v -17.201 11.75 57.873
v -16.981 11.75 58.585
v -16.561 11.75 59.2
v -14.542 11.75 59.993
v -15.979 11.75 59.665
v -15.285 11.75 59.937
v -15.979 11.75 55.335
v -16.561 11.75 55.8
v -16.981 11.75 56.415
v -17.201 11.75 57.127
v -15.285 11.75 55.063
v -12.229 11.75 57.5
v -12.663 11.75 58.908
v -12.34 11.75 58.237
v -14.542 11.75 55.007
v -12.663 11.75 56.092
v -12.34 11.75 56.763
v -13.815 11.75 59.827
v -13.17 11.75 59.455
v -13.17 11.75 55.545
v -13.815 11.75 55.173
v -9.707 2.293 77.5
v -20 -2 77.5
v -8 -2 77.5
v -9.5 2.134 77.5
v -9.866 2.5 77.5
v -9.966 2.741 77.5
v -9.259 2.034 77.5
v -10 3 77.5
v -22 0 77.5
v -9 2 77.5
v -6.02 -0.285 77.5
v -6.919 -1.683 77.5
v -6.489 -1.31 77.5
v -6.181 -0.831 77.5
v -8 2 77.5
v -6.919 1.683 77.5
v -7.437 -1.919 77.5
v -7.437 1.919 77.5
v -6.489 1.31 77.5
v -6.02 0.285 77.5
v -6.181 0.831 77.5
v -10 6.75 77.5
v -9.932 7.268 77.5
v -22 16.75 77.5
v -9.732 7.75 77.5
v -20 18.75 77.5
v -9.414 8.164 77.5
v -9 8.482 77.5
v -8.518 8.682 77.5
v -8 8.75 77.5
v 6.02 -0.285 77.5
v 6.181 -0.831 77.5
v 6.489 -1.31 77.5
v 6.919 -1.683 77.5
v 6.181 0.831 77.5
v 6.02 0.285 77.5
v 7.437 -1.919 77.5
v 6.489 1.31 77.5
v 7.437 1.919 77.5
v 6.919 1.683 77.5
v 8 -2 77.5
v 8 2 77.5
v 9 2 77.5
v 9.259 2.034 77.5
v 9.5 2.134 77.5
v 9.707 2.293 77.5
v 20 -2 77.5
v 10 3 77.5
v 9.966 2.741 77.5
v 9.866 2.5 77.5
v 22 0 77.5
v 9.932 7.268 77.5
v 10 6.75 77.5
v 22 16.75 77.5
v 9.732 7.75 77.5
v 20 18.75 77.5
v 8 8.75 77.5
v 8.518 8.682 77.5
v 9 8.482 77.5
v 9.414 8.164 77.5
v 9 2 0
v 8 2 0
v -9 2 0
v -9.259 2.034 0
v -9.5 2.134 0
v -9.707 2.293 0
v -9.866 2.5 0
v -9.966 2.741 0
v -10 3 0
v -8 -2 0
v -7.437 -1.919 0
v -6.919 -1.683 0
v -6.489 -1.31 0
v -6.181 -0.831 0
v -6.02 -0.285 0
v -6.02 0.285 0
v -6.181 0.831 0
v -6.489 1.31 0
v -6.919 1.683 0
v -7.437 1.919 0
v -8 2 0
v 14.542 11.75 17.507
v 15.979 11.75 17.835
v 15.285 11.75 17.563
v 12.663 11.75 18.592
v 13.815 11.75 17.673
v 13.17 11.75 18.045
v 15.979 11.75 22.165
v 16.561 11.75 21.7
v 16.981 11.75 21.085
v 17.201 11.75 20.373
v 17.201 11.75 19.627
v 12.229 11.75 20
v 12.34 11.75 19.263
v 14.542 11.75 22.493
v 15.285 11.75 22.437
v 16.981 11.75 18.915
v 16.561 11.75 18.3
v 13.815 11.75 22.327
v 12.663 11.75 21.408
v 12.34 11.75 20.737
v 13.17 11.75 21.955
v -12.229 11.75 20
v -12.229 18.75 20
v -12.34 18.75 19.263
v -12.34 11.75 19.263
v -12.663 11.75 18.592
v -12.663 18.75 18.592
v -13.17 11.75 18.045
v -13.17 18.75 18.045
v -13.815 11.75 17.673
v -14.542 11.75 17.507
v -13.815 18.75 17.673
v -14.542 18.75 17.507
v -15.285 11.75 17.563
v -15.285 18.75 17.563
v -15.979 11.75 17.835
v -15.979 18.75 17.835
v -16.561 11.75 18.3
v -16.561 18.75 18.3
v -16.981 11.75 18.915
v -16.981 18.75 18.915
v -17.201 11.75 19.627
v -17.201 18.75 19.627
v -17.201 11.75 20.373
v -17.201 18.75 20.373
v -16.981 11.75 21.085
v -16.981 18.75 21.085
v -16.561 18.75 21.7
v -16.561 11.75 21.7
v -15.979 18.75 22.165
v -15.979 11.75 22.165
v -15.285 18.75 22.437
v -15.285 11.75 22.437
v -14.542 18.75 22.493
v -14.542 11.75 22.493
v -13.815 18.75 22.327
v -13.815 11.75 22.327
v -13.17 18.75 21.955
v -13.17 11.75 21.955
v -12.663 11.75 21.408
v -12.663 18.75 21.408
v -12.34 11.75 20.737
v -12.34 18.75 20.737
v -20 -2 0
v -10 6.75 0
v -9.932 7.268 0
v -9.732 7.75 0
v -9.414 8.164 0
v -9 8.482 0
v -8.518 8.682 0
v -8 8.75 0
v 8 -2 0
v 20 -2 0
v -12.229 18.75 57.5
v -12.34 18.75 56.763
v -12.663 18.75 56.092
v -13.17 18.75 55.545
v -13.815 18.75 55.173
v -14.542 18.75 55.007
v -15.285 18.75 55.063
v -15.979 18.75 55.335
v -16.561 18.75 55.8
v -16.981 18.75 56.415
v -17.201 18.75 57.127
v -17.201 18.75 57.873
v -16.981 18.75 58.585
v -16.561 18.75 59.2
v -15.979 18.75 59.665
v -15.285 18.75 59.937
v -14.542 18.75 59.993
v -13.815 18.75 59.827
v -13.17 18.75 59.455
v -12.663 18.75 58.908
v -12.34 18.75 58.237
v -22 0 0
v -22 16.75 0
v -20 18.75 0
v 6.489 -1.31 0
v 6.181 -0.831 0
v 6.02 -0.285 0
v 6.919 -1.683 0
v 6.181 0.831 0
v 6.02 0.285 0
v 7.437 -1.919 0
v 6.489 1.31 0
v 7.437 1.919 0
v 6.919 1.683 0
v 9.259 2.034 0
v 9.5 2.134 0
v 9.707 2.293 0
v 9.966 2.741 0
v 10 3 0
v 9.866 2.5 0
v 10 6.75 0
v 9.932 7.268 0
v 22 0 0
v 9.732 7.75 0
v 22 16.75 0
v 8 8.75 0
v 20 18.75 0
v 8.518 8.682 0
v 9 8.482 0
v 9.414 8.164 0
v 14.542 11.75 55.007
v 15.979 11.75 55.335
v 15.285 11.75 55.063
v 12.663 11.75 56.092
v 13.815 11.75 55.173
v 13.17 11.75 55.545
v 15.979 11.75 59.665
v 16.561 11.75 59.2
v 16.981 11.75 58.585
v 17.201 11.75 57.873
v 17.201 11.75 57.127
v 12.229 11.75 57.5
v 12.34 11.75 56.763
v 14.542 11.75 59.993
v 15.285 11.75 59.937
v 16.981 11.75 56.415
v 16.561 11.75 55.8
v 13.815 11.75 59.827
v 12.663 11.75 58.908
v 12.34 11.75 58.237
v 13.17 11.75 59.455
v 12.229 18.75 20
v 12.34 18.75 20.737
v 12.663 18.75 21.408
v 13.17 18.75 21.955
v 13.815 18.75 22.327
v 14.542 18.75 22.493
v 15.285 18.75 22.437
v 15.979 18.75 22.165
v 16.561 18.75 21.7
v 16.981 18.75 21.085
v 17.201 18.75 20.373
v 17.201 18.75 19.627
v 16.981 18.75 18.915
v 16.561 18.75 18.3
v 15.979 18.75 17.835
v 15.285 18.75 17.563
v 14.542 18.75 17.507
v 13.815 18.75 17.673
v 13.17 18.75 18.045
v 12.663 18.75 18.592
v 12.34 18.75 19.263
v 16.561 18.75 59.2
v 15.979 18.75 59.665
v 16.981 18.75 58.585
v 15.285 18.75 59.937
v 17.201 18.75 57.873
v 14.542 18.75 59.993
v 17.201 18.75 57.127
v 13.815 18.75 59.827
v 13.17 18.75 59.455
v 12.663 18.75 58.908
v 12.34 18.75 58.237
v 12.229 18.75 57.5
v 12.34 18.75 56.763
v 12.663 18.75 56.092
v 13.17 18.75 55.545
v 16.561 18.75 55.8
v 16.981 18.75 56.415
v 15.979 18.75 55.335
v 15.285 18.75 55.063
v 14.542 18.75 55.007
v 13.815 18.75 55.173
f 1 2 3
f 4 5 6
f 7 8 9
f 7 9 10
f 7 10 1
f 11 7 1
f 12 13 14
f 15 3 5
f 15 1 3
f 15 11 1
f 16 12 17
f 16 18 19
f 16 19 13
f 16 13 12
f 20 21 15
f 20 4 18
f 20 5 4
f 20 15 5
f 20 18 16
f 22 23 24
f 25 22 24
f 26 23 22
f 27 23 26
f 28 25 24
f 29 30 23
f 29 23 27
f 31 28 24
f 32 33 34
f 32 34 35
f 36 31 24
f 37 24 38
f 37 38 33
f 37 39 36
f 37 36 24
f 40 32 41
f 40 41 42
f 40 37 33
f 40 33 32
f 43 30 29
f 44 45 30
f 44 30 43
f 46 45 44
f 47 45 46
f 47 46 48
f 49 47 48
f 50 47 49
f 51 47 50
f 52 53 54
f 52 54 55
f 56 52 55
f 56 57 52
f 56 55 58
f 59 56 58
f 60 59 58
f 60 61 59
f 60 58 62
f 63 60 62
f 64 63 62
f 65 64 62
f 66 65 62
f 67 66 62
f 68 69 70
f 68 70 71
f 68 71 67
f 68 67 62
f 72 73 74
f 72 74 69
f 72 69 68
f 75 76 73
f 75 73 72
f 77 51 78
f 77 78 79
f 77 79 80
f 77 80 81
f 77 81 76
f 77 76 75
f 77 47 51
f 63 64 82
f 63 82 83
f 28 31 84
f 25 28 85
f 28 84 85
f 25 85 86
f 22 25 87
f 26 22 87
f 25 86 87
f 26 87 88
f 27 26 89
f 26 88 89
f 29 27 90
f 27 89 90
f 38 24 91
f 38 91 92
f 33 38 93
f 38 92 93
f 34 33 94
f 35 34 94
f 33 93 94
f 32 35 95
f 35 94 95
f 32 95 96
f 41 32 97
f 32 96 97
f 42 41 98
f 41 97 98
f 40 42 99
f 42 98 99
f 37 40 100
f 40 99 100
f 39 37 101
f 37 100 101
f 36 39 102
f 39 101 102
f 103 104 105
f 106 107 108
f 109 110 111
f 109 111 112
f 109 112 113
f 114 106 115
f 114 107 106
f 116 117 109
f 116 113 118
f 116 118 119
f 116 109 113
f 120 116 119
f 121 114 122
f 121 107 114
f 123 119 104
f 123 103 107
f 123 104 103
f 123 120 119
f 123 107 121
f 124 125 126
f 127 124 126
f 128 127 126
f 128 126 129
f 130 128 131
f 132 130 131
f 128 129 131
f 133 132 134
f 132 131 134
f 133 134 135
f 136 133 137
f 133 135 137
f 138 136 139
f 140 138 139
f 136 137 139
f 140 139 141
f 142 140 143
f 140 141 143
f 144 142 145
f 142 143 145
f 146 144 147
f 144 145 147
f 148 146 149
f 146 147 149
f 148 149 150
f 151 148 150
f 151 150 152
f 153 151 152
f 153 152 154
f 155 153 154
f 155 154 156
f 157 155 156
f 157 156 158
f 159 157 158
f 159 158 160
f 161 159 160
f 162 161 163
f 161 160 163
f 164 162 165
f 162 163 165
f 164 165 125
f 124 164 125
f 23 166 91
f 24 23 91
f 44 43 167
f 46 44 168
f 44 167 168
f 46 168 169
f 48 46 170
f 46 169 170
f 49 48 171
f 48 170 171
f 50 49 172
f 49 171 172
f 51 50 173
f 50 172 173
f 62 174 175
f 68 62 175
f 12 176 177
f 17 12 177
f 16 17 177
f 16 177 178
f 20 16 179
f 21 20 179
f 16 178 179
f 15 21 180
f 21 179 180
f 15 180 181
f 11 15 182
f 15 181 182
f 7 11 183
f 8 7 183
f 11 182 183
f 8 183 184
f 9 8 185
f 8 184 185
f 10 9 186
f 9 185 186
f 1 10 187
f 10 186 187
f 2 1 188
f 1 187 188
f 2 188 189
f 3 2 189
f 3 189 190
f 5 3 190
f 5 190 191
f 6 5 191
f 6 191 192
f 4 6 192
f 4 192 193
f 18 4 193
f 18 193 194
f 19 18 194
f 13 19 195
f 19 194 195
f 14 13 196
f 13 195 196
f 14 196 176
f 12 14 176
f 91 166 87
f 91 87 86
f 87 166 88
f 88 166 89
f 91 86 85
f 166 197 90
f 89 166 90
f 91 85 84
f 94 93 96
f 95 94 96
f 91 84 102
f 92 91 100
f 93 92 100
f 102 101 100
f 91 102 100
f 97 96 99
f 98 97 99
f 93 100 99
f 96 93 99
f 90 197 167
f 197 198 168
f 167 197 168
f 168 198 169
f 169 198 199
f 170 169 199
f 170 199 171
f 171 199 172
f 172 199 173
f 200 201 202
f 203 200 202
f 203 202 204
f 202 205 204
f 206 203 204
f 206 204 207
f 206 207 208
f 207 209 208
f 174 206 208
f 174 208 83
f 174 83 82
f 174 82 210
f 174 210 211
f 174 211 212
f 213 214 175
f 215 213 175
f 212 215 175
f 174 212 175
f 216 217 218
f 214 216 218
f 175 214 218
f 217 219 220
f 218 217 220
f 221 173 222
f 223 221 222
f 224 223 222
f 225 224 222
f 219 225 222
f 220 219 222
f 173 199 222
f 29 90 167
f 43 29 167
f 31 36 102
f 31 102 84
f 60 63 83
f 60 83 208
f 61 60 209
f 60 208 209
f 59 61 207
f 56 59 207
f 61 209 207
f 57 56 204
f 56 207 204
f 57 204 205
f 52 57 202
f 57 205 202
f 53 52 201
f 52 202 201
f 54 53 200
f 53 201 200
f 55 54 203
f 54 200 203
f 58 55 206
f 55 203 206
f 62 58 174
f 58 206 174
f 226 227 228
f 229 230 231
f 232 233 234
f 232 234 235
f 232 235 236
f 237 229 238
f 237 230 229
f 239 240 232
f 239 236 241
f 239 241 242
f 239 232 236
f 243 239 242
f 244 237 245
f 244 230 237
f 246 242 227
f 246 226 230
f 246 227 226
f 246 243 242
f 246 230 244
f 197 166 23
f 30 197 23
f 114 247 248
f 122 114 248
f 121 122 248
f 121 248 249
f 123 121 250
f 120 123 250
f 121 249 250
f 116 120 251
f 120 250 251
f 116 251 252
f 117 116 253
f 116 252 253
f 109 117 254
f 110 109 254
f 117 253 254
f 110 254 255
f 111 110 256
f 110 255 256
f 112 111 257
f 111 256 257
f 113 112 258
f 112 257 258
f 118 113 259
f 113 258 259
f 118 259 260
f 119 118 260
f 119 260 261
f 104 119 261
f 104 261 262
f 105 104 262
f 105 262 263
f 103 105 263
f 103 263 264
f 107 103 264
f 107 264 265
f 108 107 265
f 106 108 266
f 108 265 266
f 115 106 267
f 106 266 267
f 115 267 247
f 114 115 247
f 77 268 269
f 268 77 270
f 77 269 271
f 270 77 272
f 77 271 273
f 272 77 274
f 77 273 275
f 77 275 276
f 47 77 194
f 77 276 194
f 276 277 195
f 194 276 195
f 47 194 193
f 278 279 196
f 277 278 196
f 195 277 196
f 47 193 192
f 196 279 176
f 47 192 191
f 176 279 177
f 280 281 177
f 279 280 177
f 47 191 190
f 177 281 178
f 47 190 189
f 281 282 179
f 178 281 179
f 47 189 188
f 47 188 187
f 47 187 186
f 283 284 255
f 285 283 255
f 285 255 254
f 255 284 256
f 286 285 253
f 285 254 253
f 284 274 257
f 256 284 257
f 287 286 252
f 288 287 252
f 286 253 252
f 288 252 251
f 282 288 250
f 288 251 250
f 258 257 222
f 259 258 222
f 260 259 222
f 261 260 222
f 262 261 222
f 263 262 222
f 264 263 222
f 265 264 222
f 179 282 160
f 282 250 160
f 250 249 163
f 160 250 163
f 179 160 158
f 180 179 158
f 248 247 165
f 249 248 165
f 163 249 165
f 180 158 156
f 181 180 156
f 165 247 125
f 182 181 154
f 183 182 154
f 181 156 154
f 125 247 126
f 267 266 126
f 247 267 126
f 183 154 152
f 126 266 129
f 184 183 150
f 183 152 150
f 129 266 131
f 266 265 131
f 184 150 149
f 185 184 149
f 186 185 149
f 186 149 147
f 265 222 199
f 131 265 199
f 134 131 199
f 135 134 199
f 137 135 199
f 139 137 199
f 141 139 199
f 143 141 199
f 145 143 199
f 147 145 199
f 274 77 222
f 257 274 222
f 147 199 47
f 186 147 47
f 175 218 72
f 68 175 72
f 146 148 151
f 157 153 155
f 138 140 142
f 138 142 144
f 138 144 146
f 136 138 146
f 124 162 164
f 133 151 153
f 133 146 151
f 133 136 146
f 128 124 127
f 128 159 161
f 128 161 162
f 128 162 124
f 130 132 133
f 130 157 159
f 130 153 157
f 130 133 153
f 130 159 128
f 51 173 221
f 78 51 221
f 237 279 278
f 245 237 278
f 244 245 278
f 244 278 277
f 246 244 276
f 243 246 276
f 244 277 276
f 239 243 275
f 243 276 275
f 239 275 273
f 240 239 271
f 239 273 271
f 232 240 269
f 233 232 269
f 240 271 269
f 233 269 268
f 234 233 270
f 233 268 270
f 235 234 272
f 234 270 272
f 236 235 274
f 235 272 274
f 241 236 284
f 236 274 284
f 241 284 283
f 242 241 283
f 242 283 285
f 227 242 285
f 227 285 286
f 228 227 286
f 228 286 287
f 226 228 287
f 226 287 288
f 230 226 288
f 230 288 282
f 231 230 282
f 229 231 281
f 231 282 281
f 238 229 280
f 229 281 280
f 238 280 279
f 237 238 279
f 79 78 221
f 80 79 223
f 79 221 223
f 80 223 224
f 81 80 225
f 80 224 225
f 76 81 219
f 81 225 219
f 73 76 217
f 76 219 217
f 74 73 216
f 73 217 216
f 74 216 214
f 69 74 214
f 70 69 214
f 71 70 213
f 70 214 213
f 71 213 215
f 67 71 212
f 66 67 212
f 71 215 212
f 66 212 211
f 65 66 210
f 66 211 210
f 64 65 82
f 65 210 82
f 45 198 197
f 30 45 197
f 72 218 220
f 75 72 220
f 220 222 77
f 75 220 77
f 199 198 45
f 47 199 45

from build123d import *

# Parameters (mm, degrees)
BOSS_EXTRUDE2_DEPTH = 77.5
CHAMFER1_SIZE       = 2
SKETCH2_R           = 2.5
CUT_EXTRUDE1_DEPTH  = 7


with BuildPart() as part:
    # Sketch1 → Boss-Extrude2 (new body)
    with BuildSketch(Plane.XY):
        with BuildLine():
            Line((-8, 8.75), (8, 8.75))
            ThreePointArc((8, 8.75), (9.414213562, 8.164213562), (10, 6.75))
            Line((10, 6.75), (10, 3))
            ThreePointArc((10, 3), (9.707106781, 2.292893219), (9, 2))
            Line((9, 2), (8, 2))
            ThreePointArc((8, 2), (6, 0), (8, -2))
            Line((8, -2), (9, -2))
            Line((9, -2), (22, -2))
            Line((22, -2), (22, 18.75))
            Line((22, 18.75), (-22, 18.75))
            Line((-22, 18.75), (-22, -2))
            Line((-22, -2), (-9, -2))
            Line((-9, -2), (-8, -2))
            ThreePointArc((-8, -2), (-6, 0), (-8, 2))
            Line((-8, 2), (-9, 2))
            ThreePointArc((-9, 2), (-9.707106781, 2.292893219), (-10, 3))
            Line((-10, 3), (-10, 6.75))
            ThreePointArc((-10, 6.75), (-9.414213562, 8.164213562), (-8, 8.75))
        make_face()
    extrude(amount=BOSS_EXTRUDE2_DEPTH)

    # Chamfer1
    chamfer1_edges = [part.edges().sort_by_distance(p)[0] for p in [
        (-22, -2, 38.75),
        (-22, 18.75, 38.75),
        (22, 18.75, 38.75),
        (22, -2, 38.75),
    ]]
    chamfer(chamfer1_edges, length=CHAMFER1_SIZE)

    # Sketch2 → Cut-Extrude1 (cut)
    with BuildSketch(Plane(origin=(0, 18.75, 0), x_dir=(1, 0, 0), z_dir=(0, 1, 0))):
        with Locations(Location((14.728679071, -57.5, 0), (0, 0, 180))):
            Circle(SKETCH2_R)
        with Locations(Location((14.728679071, -20, 0), (0, 0, 180))):
            Circle(SKETCH2_R)
        with Locations((-14.728679071, -57.5)):
            Circle(SKETCH2_R)
        with Locations((-14.728679071, -20)):
            Circle(SKETCH2_R)
    extrude(amount=-CUT_EXTRUDE1_DEPTH, mode=Mode.SUBTRACT)


solid = part.part
